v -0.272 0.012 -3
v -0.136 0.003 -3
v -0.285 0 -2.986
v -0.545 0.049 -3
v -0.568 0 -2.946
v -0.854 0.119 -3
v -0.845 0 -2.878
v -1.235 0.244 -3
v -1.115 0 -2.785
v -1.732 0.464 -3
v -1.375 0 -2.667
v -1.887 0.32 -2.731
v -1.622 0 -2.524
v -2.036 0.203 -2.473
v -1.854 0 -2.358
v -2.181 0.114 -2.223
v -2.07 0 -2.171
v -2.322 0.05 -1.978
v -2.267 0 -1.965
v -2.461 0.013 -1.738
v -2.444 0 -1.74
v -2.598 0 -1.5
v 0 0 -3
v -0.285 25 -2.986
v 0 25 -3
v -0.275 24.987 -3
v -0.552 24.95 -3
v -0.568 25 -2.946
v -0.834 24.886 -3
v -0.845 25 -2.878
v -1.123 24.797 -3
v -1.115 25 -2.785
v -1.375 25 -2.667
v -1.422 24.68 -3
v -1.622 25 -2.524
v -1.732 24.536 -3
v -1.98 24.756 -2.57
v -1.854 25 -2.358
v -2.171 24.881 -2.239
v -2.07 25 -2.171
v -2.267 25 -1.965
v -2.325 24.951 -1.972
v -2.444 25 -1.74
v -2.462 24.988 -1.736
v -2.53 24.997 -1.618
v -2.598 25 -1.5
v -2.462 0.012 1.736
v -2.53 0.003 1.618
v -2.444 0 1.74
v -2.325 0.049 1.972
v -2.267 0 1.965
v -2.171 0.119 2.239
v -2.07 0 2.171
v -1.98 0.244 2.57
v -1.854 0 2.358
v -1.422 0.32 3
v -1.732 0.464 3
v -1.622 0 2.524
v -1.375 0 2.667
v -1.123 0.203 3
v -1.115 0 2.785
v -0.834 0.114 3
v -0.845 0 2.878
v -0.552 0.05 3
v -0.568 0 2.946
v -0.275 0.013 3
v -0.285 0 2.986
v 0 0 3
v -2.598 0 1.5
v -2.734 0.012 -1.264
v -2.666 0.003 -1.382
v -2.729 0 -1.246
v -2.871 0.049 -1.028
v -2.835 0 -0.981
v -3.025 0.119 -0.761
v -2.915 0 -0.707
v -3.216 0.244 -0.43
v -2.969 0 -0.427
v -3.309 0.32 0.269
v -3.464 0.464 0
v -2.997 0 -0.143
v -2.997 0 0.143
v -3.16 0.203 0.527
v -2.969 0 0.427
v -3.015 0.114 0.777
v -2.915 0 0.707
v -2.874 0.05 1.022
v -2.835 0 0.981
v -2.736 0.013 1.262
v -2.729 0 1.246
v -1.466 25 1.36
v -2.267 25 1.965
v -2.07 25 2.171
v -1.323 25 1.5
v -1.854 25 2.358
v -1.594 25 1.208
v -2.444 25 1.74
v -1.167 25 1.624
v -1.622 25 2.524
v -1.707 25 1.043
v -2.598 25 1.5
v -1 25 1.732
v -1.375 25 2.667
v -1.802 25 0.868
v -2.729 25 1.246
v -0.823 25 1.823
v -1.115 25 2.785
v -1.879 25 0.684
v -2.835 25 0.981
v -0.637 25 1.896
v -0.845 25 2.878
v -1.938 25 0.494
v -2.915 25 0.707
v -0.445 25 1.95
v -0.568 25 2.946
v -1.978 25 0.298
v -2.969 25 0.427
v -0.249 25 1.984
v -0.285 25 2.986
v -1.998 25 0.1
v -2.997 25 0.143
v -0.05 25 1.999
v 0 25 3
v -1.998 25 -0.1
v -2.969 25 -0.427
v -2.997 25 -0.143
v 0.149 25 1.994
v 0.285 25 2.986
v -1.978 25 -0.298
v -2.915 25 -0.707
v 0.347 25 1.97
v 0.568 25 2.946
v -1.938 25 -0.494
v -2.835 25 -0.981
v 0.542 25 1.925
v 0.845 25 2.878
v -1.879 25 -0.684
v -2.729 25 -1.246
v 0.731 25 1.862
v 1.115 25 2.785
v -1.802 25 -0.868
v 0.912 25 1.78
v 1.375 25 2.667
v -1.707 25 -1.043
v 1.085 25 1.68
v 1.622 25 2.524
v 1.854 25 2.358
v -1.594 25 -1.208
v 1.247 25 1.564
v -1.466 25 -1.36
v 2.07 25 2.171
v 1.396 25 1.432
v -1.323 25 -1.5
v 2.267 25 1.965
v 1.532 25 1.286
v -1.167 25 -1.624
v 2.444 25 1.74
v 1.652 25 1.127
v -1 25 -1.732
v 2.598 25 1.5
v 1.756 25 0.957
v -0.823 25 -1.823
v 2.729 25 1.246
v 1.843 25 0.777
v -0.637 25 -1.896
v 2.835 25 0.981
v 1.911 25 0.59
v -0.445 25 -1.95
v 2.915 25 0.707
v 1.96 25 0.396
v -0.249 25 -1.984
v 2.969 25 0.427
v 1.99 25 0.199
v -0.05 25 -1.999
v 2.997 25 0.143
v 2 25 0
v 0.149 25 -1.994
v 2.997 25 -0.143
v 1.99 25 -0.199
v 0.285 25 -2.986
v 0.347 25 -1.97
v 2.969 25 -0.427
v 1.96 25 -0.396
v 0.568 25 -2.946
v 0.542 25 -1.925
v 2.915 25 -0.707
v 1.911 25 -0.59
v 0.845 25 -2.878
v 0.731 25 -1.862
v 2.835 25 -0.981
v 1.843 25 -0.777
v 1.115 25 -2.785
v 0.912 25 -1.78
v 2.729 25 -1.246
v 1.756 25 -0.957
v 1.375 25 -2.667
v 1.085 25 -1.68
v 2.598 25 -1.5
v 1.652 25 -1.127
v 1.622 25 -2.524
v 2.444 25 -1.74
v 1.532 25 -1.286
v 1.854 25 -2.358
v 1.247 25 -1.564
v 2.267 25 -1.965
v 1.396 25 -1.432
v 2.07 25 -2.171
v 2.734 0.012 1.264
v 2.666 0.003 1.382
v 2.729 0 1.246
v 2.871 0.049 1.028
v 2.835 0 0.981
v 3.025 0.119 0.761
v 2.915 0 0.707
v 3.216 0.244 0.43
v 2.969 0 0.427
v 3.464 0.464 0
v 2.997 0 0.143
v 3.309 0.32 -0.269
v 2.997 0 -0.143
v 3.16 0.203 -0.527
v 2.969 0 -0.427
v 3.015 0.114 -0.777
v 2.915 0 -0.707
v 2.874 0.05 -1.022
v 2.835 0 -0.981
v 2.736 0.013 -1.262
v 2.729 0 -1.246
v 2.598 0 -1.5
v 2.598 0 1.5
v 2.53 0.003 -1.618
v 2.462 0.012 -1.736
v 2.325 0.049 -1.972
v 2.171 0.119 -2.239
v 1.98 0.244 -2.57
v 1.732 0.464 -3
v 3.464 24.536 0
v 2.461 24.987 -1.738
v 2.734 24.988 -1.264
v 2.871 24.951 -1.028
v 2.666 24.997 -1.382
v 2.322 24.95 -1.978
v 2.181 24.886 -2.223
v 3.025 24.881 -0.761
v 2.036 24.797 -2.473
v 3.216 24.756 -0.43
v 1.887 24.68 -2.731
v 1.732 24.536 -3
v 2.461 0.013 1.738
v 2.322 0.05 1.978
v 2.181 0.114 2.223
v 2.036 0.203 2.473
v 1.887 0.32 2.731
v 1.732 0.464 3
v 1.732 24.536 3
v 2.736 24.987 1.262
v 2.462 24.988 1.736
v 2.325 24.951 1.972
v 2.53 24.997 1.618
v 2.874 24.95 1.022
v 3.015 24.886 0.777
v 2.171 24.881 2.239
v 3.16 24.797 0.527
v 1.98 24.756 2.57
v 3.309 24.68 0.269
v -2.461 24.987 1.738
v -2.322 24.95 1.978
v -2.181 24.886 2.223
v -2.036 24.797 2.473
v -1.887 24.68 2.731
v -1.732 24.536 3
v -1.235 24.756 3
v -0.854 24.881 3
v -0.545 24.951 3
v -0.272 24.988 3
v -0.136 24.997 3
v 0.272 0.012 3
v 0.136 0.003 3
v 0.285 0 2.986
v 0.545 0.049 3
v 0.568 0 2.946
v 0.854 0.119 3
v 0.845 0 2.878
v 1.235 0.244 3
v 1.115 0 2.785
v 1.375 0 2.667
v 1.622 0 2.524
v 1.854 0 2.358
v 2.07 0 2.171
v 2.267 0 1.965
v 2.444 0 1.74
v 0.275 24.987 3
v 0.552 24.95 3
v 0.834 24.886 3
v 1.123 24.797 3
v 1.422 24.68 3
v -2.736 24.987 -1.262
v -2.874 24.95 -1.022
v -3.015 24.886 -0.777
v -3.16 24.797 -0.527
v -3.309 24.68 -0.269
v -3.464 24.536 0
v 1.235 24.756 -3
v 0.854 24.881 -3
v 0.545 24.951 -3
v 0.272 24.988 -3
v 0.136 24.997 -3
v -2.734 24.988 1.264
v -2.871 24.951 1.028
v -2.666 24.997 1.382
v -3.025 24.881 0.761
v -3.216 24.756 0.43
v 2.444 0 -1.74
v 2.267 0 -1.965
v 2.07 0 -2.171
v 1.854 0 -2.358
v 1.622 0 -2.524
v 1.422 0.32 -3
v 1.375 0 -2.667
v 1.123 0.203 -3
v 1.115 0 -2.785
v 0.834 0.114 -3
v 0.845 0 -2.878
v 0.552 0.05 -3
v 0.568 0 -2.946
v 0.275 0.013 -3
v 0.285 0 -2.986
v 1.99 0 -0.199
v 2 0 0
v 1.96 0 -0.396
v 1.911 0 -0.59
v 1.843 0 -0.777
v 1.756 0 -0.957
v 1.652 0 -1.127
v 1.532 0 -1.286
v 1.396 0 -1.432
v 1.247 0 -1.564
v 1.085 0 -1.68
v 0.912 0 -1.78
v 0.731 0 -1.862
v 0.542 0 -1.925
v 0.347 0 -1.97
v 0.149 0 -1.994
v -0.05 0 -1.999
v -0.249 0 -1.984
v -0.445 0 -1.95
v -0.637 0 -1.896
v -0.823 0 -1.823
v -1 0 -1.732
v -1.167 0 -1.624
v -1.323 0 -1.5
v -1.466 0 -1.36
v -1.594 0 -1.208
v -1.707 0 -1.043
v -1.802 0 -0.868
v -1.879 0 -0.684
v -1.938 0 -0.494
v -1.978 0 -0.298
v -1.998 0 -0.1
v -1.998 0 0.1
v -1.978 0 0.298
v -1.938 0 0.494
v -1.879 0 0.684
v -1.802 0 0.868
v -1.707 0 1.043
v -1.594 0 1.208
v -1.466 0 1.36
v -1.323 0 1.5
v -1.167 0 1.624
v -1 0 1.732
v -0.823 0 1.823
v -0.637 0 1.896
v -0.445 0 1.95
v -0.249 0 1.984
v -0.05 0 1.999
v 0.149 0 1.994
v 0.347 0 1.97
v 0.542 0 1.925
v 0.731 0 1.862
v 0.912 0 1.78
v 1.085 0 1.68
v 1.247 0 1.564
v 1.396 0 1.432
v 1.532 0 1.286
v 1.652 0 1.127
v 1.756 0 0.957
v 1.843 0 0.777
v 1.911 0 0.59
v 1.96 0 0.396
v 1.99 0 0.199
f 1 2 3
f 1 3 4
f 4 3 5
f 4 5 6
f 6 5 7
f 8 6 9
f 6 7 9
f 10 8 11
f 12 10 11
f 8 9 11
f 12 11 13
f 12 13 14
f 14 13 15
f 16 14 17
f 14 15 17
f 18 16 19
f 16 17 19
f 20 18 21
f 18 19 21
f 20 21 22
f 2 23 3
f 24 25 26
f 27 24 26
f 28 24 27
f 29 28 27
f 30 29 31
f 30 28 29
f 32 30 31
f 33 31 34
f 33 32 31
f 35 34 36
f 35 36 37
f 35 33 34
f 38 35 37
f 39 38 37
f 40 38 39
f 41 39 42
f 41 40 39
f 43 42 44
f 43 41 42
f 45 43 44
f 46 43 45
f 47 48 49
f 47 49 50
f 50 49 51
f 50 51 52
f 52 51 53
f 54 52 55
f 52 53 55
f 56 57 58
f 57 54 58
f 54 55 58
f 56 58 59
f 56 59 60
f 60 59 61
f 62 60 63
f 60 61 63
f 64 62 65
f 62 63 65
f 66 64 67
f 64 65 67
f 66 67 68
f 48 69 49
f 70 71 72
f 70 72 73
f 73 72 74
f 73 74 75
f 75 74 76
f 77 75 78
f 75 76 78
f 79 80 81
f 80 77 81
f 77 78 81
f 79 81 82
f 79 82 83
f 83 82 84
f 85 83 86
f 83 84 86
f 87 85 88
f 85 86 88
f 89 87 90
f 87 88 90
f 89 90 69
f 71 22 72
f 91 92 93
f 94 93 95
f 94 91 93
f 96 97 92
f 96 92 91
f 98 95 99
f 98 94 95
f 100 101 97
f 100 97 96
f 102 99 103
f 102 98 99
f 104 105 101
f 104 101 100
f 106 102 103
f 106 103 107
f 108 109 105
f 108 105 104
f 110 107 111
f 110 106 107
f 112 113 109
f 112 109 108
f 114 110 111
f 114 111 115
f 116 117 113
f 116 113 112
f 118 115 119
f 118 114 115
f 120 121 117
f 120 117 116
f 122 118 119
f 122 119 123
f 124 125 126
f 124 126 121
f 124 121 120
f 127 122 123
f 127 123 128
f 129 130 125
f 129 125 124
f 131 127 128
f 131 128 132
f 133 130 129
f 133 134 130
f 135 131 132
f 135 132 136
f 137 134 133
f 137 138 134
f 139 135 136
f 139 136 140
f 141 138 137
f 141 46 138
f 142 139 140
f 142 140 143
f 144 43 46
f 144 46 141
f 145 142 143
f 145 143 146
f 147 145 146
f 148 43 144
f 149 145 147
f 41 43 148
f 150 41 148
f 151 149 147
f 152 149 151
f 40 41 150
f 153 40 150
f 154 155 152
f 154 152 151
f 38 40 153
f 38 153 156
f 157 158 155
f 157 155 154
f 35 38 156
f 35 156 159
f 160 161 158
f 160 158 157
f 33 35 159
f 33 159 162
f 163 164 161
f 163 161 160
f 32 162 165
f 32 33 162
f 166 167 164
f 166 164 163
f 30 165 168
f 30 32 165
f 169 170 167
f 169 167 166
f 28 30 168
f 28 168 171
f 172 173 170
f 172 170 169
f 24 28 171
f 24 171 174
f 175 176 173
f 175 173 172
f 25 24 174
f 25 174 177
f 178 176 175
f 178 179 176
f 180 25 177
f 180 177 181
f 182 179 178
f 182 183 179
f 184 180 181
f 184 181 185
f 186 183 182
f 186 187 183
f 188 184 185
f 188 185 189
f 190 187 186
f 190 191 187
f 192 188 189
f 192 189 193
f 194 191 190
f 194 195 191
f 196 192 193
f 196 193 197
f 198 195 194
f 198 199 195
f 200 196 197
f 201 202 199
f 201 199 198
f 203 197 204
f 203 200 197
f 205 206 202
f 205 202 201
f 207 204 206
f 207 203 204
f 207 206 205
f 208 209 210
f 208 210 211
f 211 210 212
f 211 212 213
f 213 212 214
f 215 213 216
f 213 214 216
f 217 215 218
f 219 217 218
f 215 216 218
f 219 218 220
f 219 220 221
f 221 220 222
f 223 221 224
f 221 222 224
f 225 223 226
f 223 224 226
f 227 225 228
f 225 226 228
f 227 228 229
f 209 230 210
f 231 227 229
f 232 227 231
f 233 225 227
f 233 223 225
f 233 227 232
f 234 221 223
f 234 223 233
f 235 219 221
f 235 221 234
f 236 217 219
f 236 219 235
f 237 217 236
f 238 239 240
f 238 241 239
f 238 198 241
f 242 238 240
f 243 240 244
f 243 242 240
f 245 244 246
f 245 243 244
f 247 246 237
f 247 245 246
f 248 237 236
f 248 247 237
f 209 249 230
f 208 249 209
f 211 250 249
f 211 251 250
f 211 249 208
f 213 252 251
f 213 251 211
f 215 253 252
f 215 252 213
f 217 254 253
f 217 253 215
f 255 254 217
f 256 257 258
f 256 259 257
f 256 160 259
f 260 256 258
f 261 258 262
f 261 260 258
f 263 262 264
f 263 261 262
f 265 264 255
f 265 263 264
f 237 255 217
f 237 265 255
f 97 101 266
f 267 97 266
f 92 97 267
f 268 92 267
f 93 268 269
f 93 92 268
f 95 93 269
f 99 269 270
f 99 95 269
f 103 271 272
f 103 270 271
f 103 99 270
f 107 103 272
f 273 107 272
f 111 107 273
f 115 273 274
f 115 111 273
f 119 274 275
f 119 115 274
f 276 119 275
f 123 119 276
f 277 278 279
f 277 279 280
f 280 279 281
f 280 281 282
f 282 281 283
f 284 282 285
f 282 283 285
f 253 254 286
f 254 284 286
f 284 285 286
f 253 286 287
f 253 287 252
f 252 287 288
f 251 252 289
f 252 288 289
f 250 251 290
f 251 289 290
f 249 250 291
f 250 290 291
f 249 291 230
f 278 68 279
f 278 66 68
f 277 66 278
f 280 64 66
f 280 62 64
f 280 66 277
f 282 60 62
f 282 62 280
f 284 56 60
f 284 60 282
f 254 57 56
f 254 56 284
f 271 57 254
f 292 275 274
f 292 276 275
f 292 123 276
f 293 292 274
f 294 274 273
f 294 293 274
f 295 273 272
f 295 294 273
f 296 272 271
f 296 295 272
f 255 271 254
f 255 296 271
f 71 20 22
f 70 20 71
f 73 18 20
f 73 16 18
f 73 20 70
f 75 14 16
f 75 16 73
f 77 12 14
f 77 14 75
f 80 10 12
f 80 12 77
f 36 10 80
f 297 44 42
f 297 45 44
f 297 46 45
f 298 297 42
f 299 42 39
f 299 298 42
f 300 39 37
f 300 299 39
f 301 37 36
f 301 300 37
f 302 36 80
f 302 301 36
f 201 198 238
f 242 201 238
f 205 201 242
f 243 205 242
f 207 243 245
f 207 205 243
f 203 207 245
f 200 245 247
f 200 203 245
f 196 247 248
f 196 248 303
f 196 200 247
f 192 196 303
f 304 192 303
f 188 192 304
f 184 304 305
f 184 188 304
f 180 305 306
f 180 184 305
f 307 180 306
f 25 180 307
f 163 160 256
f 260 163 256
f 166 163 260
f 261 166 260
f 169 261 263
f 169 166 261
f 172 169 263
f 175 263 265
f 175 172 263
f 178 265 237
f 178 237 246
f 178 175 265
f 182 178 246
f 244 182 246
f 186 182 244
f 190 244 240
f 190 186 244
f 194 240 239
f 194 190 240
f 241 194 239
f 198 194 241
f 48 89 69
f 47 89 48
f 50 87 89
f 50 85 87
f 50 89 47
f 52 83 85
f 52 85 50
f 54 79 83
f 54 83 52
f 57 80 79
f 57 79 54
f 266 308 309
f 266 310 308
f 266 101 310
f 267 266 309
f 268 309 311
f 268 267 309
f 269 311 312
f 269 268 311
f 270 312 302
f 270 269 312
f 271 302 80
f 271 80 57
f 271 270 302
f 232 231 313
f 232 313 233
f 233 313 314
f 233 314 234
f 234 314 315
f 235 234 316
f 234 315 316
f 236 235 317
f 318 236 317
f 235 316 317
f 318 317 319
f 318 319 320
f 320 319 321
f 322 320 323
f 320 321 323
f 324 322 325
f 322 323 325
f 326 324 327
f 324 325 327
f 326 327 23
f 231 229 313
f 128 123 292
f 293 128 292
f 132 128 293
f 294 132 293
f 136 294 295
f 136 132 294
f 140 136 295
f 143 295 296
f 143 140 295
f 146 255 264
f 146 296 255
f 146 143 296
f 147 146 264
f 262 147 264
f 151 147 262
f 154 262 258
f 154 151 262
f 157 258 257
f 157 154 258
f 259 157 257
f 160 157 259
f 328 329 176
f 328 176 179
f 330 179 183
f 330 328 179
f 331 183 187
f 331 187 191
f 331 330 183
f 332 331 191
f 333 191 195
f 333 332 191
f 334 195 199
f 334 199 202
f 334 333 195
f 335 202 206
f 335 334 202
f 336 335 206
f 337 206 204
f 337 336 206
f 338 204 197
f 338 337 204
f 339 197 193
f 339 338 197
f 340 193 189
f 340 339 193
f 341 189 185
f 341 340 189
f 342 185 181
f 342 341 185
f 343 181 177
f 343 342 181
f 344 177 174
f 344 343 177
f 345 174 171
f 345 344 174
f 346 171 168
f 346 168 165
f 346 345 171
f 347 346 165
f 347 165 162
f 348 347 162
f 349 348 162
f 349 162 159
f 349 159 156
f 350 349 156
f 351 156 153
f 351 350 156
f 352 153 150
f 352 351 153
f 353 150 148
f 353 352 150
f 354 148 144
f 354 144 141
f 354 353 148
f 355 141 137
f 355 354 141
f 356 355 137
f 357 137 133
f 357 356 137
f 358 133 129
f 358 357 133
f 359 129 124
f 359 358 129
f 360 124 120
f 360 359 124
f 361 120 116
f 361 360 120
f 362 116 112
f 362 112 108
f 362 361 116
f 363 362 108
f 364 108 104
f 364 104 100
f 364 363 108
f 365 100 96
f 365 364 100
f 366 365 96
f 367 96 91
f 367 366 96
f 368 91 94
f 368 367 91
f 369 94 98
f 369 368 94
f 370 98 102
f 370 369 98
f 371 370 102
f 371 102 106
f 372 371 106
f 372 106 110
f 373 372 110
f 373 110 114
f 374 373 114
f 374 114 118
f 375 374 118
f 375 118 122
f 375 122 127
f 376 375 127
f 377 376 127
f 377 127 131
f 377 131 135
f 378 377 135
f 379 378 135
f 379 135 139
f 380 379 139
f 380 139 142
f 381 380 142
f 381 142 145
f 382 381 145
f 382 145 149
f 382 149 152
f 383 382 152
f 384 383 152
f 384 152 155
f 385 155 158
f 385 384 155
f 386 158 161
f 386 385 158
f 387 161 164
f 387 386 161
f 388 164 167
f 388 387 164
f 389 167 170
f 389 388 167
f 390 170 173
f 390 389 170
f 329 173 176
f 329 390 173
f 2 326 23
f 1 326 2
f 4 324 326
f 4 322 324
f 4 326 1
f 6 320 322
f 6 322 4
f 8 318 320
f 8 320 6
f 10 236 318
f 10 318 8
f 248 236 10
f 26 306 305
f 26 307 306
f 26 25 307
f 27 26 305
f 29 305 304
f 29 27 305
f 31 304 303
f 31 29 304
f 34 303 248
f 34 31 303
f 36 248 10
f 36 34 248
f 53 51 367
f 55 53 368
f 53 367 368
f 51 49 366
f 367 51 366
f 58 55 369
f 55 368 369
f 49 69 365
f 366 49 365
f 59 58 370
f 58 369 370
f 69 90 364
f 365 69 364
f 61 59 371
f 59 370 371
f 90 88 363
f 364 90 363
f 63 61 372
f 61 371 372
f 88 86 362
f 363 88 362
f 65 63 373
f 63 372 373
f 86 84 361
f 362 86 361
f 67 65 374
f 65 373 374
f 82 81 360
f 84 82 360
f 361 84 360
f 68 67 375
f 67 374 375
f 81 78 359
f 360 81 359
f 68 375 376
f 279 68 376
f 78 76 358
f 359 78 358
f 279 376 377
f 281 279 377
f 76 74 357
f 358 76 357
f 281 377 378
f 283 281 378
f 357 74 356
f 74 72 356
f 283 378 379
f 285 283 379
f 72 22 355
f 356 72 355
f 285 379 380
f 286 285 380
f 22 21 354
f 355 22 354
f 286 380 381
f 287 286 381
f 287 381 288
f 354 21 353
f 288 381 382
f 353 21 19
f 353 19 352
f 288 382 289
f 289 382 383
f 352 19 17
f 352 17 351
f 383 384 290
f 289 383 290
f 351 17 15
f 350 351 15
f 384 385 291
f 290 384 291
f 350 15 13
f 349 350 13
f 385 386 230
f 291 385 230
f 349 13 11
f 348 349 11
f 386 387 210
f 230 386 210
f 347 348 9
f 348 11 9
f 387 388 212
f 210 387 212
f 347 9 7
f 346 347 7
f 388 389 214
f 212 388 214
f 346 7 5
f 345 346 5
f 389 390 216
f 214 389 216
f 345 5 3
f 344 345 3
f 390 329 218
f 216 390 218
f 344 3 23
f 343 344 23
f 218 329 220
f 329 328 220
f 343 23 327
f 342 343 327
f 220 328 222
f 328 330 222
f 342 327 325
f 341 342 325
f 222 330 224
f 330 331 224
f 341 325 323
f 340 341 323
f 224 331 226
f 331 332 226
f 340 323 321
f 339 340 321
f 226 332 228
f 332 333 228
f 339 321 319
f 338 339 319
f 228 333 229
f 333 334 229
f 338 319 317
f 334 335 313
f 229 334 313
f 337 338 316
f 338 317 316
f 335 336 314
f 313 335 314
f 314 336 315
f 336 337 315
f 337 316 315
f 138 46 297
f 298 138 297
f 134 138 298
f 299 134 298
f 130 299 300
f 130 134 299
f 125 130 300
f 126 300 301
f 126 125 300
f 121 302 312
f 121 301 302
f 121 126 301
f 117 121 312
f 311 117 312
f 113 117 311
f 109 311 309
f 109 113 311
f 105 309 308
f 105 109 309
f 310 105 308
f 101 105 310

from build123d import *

# Parameters (mm, degrees)
SKETCH_1_R          = 3.5
SKETCH_1_R_2        = 2
EXTRUDE_1_DEPTH     = 25
CHAMFER_1_SIZE      = 0.5
SKETCH_2_OUTSIDE_W  = 14.378
SKETCH_2_OUTSIDE_H  = 14.378
CUT_EXTRUDE_1_DEPTH = 26


with BuildPart() as part:
    # 草图1 → 凸台-拉伸1 (new body)
    with BuildSketch(Plane(origin=(0, 0, 0), x_dir=(1, 0, 0), z_dir=(0, 1, 0))):
        Circle(SKETCH_1_R)
        Circle(SKETCH_1_R_2, mode=Mode.SUBTRACT)
    extrude(amount=EXTRUDE_1_DEPTH)

    # 倒角1
    chamfer_1_edges = [part.edges().sort_by_distance(p)[0] for p in [
        (-3.5, 0, 0),
        (-3.5, 25, 0),
    ]]
    chamfer(chamfer_1_edges, length=CHAMFER_1_SIZE)

    # 草图2 outside → 切除-拉伸1 (cut, through all)
    with BuildSketch(Plane(origin=(0, 25, 0), x_dir=(1, 0, 0), z_dir=(0, 1, 0))):
        Rectangle(SKETCH_2_OUTSIDE_W, SKETCH_2_OUTSIDE_H)
        Polygon((1.732050808, 3), (-1.732050808, 3), (-3.464101615, 0), (-1.732050808, -3), (1.732050808, -3), (3.464101615, 0), align=None, mode=Mode.SUBTRACT)
    extrude(amount=-CUT_EXTRUDE_1_DEPTH, mode=Mode.SUBTRACT)


solid = part.part
